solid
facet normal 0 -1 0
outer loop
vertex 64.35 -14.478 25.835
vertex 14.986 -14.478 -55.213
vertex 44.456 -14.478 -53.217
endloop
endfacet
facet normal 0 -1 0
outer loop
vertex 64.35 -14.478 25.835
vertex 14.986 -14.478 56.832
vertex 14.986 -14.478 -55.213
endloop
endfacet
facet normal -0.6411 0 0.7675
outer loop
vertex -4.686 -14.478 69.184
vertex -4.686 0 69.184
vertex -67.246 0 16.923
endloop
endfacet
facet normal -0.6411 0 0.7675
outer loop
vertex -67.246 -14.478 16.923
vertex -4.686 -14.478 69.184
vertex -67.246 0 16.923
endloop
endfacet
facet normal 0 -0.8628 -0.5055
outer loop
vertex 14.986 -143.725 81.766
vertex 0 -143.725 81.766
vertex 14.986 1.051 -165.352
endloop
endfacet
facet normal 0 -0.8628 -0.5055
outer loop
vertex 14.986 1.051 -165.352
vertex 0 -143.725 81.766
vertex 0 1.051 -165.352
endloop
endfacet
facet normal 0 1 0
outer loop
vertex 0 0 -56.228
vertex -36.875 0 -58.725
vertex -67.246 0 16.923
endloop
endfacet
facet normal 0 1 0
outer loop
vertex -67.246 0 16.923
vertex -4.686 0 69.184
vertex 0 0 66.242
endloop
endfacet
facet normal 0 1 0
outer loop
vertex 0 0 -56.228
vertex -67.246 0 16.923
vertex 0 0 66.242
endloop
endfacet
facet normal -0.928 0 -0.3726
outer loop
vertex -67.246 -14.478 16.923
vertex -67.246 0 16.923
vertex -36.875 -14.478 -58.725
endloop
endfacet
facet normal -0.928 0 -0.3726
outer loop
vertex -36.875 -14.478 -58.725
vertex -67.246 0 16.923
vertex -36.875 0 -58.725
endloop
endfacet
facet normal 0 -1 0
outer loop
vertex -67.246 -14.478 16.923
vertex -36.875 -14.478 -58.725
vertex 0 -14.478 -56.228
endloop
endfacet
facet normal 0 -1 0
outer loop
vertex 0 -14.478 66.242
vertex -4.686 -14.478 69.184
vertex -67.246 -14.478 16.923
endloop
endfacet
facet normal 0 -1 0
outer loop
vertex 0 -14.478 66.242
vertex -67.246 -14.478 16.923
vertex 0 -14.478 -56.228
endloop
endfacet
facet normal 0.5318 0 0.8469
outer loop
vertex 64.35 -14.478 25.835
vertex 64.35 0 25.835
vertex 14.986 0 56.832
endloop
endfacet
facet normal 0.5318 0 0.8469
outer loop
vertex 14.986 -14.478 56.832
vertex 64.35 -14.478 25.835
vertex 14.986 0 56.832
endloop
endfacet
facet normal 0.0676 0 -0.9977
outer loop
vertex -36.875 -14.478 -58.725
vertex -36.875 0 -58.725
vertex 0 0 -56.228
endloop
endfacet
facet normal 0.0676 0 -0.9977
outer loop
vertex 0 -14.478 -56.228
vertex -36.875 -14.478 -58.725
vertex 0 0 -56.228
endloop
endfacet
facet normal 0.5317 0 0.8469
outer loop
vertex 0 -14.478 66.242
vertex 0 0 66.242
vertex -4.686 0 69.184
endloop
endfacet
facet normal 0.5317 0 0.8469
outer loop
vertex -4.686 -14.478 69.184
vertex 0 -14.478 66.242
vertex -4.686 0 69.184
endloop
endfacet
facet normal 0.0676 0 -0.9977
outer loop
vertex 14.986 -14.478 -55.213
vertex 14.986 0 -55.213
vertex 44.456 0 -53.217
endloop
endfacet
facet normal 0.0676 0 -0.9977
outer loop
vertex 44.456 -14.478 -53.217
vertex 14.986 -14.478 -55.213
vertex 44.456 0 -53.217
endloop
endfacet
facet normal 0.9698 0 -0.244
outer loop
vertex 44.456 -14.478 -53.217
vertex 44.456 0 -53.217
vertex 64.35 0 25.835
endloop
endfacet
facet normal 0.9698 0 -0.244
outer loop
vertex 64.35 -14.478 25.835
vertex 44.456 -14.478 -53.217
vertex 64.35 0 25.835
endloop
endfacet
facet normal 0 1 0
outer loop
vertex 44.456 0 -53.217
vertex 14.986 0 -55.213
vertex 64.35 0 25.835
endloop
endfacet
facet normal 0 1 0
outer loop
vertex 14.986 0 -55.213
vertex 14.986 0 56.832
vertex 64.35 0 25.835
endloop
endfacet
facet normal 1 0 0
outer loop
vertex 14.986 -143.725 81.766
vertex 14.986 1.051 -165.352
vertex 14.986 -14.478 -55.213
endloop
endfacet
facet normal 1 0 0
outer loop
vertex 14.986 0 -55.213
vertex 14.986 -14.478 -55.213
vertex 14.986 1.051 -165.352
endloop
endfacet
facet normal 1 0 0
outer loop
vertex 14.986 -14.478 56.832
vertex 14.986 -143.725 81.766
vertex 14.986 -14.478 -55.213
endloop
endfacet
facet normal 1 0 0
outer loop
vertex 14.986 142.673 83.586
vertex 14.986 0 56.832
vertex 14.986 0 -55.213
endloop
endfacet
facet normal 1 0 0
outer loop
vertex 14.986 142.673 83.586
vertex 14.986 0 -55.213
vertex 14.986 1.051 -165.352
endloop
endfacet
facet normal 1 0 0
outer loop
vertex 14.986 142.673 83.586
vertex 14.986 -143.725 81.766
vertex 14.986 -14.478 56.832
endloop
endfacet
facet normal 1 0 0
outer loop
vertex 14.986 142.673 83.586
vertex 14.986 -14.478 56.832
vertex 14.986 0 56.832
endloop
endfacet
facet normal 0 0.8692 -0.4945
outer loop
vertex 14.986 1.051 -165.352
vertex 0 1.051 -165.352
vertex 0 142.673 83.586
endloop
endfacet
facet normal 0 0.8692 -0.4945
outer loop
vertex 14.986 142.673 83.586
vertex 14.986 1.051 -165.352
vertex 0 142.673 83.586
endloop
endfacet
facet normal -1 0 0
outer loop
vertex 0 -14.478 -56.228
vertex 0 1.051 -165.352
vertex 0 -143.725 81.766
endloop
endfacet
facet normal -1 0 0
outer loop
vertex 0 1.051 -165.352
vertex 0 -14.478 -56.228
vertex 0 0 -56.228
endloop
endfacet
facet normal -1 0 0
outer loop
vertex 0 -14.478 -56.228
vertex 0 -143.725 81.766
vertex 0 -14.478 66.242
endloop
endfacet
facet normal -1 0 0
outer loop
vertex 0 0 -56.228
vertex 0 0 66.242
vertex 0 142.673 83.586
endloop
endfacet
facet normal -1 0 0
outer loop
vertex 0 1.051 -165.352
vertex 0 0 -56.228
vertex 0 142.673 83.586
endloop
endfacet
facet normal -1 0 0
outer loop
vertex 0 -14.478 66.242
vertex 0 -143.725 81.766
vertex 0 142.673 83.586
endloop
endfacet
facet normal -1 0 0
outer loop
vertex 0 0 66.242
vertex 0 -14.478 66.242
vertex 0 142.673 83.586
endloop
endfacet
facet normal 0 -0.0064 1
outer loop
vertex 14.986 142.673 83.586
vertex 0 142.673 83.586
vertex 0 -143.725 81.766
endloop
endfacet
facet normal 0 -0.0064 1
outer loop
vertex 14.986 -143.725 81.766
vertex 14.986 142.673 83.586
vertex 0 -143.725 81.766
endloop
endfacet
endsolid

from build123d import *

# Parameters (mm, degrees)
F2_DEPTH = 14.986
F3_DEPTH = 14.478


with BuildPart() as f2:
    # F1 (on Right) → F2 (new body)
    with BuildSketch(Plane.YZ):
        Polygon((-143.724723, 81.765599), (1.051276, -165.352061), (142.673448, 83.586462), align=None)
    extrude(amount=F2_DEPTH)

    # F0 (on Front) → F3 (join)
    with BuildSketch(Plane.XZ):
        Polygon((44.456244, -53.21716), (64.350262, 25.835394), (-4.685595, 69.184312), (-67.246119, 16.922862), (-36.874792, -58.725407), align=None)
    extrude(amount=F3_DEPTH)


solid = f2.part
